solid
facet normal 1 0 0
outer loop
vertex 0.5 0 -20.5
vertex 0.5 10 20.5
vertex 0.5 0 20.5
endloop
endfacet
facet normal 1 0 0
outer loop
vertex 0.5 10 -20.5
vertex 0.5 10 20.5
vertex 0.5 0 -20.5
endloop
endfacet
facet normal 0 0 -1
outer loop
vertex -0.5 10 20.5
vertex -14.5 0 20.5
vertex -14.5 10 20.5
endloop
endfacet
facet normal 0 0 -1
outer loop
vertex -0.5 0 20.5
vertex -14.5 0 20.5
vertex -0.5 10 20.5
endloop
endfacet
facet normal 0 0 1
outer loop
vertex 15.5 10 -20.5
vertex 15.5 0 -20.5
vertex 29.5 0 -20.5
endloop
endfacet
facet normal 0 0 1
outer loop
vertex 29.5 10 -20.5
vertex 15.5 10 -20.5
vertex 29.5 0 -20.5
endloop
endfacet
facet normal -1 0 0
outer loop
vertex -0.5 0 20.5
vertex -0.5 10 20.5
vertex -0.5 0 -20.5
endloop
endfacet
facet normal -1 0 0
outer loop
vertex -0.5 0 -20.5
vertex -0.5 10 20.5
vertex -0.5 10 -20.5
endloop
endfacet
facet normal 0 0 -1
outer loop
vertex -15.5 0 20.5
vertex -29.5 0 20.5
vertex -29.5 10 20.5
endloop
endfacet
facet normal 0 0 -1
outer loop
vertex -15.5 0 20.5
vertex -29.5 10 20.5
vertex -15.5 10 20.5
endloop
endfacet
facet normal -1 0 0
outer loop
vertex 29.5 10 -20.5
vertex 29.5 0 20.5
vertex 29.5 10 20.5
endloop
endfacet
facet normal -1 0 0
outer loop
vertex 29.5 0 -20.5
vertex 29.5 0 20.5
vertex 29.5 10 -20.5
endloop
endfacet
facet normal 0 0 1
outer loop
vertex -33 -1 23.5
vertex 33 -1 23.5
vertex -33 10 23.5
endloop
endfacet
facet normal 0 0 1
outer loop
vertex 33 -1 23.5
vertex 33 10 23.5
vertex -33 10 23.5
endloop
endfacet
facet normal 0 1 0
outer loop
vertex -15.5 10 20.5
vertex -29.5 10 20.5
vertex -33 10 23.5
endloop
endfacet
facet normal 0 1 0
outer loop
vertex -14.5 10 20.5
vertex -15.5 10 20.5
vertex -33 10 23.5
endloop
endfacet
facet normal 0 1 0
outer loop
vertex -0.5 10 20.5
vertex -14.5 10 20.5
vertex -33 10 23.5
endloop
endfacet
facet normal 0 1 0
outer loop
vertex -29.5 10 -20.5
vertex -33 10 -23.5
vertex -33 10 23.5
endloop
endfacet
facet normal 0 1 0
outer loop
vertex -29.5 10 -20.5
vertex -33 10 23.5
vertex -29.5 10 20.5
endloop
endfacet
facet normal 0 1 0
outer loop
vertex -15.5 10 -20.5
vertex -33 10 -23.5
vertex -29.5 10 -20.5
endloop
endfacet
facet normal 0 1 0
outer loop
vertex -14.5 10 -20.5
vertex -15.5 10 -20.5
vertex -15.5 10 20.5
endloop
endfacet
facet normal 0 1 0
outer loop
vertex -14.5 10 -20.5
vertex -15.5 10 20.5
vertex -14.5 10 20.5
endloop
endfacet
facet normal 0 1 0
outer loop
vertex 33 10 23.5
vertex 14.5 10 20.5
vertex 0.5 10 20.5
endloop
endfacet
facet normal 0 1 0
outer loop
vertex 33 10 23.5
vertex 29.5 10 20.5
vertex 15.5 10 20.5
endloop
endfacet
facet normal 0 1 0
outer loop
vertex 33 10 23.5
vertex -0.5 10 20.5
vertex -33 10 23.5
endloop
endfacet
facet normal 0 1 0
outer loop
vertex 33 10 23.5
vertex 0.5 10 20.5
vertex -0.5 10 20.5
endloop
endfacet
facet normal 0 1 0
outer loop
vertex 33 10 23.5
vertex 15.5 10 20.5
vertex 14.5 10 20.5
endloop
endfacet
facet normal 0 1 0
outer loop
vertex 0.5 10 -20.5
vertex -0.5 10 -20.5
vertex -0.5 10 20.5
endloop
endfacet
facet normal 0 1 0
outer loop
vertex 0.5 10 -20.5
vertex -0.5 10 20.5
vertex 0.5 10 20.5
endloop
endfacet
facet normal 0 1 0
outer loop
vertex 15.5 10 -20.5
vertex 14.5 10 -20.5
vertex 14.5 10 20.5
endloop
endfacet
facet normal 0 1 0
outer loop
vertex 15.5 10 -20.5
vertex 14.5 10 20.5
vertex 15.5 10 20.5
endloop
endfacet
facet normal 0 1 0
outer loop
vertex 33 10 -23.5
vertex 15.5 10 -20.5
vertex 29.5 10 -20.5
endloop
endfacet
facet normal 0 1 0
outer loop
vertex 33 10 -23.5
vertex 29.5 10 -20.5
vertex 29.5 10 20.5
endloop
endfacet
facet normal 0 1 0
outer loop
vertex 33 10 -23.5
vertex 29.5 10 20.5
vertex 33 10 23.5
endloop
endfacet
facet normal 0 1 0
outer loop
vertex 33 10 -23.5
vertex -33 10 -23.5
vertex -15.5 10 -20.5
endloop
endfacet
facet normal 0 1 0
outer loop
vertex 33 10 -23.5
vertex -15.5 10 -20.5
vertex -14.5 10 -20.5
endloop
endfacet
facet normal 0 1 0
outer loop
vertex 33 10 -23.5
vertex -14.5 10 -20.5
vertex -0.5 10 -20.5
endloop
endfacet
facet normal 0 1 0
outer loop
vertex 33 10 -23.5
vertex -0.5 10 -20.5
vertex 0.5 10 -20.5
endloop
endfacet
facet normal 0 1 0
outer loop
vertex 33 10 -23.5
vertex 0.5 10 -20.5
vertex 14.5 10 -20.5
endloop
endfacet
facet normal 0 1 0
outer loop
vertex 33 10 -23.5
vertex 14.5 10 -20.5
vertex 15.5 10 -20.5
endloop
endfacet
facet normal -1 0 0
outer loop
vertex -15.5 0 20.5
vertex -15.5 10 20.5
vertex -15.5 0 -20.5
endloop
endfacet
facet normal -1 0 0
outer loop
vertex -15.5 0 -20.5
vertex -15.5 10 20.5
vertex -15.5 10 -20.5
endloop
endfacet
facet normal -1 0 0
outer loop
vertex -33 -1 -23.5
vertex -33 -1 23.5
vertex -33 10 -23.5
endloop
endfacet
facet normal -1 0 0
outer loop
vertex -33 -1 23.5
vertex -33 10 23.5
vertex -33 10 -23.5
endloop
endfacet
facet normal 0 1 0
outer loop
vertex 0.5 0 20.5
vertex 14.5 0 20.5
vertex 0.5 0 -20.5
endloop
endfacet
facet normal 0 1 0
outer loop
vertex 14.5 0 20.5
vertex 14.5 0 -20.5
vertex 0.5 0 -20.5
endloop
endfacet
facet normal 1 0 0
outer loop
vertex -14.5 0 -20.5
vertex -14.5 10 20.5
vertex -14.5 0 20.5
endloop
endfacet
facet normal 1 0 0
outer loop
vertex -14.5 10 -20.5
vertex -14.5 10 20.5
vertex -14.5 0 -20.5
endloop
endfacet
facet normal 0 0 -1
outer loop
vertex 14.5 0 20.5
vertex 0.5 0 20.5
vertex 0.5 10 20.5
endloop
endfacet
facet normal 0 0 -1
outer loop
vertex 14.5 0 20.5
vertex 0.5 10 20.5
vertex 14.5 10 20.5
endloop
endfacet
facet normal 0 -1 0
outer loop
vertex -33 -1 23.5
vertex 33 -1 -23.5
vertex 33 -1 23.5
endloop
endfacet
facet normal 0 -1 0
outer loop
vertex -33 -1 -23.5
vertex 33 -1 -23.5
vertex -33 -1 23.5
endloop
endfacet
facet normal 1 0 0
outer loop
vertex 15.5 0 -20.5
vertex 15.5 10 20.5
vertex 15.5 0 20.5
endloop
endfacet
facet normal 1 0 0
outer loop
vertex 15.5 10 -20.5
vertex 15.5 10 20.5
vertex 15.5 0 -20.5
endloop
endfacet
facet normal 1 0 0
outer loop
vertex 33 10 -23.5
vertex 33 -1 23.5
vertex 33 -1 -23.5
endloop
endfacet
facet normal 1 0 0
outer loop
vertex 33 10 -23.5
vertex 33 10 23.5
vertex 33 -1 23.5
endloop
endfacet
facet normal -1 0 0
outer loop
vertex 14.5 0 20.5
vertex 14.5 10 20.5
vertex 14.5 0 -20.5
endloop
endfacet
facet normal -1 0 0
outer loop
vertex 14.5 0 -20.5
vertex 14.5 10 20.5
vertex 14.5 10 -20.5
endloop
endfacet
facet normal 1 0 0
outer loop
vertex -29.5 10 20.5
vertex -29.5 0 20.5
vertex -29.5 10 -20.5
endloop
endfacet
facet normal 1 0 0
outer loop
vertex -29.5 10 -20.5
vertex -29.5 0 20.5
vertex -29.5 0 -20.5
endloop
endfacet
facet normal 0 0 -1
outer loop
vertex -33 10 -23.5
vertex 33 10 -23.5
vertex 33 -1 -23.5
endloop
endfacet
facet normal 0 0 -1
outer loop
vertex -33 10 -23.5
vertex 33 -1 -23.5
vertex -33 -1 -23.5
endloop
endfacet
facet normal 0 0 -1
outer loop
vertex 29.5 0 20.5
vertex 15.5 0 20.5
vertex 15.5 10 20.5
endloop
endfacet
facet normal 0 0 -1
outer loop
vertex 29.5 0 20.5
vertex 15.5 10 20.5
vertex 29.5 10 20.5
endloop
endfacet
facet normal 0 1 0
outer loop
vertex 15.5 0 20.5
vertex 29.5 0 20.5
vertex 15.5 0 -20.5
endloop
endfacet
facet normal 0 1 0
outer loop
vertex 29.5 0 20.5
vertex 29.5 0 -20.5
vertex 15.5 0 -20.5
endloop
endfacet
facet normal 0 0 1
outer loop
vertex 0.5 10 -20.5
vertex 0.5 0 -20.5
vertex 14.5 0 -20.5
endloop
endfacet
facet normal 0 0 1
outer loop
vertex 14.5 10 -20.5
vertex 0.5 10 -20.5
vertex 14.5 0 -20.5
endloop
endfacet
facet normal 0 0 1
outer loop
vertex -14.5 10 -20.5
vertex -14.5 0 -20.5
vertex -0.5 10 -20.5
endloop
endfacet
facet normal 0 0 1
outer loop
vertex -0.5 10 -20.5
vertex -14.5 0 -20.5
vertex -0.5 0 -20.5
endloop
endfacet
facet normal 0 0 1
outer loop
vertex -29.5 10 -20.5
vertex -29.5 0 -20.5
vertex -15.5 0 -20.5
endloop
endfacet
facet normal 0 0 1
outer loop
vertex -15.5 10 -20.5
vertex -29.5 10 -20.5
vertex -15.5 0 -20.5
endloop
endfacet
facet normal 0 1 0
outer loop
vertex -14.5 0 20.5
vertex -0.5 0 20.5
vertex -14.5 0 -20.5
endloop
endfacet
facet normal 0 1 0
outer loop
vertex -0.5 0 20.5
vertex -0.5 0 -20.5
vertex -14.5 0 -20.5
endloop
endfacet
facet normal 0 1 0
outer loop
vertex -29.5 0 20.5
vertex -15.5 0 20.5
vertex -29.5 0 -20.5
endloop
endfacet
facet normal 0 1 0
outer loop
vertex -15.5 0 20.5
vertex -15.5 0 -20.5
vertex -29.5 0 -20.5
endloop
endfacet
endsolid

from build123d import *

# Parameters (mm, degrees)
SKETCH1_W           = 66
SKETCH1_H           = 47
SKETCH1_W_2         = 59
SKETCH1_H_2         = 41
BOSS_EXTRUDE1_DEPTH = 10
SKETCH3_W           = 66
SKETCH3_H           = 47
BOSS_EXTRUDE2_DEPTH = 1
SKETCH6_W           = 1
SKETCH6_H           = 41
SKETCH6_W_2         = 0.5
BOSS_EXTRUDE3_DEPTH = 10


with BuildPart() as part:
    # Sketch1 → Boss-Extrude1 (new body)
    with BuildSketch(Plane(origin=(0, 0, 0), x_dir=(1, 0, 0), z_dir=(0, 1, 0))):
        Rectangle(SKETCH1_W, SKETCH1_H)
        Rectangle(SKETCH1_W_2, SKETCH1_H_2, mode=Mode.SUBTRACT)
    extrude(amount=BOSS_EXTRUDE1_DEPTH)

    # Sketch3 → Boss-Extrude2 (add)
    with BuildSketch(Plane(origin=(0, 0, 0), x_dir=(-1, 0, 0), z_dir=(0, -1, 0))):
        Rectangle(SKETCH3_W, SKETCH3_H)
    extrude(amount=BOSS_EXTRUDE2_DEPTH)

    # Sketch6 → Boss-Extrude3 (add)
    with BuildSketch(Plane(origin=(0, 10, 0), x_dir=(1, 0, 0), z_dir=(0, 1, 0))):
        with Locations((-15, 0)):
            Rectangle(SKETCH6_W, SKETCH6_H)
        with Locations((-0.25, 0)):
            Rectangle(SKETCH6_W_2, SKETCH6_H)
        with Locations((0.25, 0)):
            Rectangle(SKETCH6_W_2, SKETCH6_H)
        with Locations((15, 0)):
            Rectangle(SKETCH6_W, SKETCH6_H)
    extrude(amount=-BOSS_EXTRUDE3_DEPTH)


solid = part.part
